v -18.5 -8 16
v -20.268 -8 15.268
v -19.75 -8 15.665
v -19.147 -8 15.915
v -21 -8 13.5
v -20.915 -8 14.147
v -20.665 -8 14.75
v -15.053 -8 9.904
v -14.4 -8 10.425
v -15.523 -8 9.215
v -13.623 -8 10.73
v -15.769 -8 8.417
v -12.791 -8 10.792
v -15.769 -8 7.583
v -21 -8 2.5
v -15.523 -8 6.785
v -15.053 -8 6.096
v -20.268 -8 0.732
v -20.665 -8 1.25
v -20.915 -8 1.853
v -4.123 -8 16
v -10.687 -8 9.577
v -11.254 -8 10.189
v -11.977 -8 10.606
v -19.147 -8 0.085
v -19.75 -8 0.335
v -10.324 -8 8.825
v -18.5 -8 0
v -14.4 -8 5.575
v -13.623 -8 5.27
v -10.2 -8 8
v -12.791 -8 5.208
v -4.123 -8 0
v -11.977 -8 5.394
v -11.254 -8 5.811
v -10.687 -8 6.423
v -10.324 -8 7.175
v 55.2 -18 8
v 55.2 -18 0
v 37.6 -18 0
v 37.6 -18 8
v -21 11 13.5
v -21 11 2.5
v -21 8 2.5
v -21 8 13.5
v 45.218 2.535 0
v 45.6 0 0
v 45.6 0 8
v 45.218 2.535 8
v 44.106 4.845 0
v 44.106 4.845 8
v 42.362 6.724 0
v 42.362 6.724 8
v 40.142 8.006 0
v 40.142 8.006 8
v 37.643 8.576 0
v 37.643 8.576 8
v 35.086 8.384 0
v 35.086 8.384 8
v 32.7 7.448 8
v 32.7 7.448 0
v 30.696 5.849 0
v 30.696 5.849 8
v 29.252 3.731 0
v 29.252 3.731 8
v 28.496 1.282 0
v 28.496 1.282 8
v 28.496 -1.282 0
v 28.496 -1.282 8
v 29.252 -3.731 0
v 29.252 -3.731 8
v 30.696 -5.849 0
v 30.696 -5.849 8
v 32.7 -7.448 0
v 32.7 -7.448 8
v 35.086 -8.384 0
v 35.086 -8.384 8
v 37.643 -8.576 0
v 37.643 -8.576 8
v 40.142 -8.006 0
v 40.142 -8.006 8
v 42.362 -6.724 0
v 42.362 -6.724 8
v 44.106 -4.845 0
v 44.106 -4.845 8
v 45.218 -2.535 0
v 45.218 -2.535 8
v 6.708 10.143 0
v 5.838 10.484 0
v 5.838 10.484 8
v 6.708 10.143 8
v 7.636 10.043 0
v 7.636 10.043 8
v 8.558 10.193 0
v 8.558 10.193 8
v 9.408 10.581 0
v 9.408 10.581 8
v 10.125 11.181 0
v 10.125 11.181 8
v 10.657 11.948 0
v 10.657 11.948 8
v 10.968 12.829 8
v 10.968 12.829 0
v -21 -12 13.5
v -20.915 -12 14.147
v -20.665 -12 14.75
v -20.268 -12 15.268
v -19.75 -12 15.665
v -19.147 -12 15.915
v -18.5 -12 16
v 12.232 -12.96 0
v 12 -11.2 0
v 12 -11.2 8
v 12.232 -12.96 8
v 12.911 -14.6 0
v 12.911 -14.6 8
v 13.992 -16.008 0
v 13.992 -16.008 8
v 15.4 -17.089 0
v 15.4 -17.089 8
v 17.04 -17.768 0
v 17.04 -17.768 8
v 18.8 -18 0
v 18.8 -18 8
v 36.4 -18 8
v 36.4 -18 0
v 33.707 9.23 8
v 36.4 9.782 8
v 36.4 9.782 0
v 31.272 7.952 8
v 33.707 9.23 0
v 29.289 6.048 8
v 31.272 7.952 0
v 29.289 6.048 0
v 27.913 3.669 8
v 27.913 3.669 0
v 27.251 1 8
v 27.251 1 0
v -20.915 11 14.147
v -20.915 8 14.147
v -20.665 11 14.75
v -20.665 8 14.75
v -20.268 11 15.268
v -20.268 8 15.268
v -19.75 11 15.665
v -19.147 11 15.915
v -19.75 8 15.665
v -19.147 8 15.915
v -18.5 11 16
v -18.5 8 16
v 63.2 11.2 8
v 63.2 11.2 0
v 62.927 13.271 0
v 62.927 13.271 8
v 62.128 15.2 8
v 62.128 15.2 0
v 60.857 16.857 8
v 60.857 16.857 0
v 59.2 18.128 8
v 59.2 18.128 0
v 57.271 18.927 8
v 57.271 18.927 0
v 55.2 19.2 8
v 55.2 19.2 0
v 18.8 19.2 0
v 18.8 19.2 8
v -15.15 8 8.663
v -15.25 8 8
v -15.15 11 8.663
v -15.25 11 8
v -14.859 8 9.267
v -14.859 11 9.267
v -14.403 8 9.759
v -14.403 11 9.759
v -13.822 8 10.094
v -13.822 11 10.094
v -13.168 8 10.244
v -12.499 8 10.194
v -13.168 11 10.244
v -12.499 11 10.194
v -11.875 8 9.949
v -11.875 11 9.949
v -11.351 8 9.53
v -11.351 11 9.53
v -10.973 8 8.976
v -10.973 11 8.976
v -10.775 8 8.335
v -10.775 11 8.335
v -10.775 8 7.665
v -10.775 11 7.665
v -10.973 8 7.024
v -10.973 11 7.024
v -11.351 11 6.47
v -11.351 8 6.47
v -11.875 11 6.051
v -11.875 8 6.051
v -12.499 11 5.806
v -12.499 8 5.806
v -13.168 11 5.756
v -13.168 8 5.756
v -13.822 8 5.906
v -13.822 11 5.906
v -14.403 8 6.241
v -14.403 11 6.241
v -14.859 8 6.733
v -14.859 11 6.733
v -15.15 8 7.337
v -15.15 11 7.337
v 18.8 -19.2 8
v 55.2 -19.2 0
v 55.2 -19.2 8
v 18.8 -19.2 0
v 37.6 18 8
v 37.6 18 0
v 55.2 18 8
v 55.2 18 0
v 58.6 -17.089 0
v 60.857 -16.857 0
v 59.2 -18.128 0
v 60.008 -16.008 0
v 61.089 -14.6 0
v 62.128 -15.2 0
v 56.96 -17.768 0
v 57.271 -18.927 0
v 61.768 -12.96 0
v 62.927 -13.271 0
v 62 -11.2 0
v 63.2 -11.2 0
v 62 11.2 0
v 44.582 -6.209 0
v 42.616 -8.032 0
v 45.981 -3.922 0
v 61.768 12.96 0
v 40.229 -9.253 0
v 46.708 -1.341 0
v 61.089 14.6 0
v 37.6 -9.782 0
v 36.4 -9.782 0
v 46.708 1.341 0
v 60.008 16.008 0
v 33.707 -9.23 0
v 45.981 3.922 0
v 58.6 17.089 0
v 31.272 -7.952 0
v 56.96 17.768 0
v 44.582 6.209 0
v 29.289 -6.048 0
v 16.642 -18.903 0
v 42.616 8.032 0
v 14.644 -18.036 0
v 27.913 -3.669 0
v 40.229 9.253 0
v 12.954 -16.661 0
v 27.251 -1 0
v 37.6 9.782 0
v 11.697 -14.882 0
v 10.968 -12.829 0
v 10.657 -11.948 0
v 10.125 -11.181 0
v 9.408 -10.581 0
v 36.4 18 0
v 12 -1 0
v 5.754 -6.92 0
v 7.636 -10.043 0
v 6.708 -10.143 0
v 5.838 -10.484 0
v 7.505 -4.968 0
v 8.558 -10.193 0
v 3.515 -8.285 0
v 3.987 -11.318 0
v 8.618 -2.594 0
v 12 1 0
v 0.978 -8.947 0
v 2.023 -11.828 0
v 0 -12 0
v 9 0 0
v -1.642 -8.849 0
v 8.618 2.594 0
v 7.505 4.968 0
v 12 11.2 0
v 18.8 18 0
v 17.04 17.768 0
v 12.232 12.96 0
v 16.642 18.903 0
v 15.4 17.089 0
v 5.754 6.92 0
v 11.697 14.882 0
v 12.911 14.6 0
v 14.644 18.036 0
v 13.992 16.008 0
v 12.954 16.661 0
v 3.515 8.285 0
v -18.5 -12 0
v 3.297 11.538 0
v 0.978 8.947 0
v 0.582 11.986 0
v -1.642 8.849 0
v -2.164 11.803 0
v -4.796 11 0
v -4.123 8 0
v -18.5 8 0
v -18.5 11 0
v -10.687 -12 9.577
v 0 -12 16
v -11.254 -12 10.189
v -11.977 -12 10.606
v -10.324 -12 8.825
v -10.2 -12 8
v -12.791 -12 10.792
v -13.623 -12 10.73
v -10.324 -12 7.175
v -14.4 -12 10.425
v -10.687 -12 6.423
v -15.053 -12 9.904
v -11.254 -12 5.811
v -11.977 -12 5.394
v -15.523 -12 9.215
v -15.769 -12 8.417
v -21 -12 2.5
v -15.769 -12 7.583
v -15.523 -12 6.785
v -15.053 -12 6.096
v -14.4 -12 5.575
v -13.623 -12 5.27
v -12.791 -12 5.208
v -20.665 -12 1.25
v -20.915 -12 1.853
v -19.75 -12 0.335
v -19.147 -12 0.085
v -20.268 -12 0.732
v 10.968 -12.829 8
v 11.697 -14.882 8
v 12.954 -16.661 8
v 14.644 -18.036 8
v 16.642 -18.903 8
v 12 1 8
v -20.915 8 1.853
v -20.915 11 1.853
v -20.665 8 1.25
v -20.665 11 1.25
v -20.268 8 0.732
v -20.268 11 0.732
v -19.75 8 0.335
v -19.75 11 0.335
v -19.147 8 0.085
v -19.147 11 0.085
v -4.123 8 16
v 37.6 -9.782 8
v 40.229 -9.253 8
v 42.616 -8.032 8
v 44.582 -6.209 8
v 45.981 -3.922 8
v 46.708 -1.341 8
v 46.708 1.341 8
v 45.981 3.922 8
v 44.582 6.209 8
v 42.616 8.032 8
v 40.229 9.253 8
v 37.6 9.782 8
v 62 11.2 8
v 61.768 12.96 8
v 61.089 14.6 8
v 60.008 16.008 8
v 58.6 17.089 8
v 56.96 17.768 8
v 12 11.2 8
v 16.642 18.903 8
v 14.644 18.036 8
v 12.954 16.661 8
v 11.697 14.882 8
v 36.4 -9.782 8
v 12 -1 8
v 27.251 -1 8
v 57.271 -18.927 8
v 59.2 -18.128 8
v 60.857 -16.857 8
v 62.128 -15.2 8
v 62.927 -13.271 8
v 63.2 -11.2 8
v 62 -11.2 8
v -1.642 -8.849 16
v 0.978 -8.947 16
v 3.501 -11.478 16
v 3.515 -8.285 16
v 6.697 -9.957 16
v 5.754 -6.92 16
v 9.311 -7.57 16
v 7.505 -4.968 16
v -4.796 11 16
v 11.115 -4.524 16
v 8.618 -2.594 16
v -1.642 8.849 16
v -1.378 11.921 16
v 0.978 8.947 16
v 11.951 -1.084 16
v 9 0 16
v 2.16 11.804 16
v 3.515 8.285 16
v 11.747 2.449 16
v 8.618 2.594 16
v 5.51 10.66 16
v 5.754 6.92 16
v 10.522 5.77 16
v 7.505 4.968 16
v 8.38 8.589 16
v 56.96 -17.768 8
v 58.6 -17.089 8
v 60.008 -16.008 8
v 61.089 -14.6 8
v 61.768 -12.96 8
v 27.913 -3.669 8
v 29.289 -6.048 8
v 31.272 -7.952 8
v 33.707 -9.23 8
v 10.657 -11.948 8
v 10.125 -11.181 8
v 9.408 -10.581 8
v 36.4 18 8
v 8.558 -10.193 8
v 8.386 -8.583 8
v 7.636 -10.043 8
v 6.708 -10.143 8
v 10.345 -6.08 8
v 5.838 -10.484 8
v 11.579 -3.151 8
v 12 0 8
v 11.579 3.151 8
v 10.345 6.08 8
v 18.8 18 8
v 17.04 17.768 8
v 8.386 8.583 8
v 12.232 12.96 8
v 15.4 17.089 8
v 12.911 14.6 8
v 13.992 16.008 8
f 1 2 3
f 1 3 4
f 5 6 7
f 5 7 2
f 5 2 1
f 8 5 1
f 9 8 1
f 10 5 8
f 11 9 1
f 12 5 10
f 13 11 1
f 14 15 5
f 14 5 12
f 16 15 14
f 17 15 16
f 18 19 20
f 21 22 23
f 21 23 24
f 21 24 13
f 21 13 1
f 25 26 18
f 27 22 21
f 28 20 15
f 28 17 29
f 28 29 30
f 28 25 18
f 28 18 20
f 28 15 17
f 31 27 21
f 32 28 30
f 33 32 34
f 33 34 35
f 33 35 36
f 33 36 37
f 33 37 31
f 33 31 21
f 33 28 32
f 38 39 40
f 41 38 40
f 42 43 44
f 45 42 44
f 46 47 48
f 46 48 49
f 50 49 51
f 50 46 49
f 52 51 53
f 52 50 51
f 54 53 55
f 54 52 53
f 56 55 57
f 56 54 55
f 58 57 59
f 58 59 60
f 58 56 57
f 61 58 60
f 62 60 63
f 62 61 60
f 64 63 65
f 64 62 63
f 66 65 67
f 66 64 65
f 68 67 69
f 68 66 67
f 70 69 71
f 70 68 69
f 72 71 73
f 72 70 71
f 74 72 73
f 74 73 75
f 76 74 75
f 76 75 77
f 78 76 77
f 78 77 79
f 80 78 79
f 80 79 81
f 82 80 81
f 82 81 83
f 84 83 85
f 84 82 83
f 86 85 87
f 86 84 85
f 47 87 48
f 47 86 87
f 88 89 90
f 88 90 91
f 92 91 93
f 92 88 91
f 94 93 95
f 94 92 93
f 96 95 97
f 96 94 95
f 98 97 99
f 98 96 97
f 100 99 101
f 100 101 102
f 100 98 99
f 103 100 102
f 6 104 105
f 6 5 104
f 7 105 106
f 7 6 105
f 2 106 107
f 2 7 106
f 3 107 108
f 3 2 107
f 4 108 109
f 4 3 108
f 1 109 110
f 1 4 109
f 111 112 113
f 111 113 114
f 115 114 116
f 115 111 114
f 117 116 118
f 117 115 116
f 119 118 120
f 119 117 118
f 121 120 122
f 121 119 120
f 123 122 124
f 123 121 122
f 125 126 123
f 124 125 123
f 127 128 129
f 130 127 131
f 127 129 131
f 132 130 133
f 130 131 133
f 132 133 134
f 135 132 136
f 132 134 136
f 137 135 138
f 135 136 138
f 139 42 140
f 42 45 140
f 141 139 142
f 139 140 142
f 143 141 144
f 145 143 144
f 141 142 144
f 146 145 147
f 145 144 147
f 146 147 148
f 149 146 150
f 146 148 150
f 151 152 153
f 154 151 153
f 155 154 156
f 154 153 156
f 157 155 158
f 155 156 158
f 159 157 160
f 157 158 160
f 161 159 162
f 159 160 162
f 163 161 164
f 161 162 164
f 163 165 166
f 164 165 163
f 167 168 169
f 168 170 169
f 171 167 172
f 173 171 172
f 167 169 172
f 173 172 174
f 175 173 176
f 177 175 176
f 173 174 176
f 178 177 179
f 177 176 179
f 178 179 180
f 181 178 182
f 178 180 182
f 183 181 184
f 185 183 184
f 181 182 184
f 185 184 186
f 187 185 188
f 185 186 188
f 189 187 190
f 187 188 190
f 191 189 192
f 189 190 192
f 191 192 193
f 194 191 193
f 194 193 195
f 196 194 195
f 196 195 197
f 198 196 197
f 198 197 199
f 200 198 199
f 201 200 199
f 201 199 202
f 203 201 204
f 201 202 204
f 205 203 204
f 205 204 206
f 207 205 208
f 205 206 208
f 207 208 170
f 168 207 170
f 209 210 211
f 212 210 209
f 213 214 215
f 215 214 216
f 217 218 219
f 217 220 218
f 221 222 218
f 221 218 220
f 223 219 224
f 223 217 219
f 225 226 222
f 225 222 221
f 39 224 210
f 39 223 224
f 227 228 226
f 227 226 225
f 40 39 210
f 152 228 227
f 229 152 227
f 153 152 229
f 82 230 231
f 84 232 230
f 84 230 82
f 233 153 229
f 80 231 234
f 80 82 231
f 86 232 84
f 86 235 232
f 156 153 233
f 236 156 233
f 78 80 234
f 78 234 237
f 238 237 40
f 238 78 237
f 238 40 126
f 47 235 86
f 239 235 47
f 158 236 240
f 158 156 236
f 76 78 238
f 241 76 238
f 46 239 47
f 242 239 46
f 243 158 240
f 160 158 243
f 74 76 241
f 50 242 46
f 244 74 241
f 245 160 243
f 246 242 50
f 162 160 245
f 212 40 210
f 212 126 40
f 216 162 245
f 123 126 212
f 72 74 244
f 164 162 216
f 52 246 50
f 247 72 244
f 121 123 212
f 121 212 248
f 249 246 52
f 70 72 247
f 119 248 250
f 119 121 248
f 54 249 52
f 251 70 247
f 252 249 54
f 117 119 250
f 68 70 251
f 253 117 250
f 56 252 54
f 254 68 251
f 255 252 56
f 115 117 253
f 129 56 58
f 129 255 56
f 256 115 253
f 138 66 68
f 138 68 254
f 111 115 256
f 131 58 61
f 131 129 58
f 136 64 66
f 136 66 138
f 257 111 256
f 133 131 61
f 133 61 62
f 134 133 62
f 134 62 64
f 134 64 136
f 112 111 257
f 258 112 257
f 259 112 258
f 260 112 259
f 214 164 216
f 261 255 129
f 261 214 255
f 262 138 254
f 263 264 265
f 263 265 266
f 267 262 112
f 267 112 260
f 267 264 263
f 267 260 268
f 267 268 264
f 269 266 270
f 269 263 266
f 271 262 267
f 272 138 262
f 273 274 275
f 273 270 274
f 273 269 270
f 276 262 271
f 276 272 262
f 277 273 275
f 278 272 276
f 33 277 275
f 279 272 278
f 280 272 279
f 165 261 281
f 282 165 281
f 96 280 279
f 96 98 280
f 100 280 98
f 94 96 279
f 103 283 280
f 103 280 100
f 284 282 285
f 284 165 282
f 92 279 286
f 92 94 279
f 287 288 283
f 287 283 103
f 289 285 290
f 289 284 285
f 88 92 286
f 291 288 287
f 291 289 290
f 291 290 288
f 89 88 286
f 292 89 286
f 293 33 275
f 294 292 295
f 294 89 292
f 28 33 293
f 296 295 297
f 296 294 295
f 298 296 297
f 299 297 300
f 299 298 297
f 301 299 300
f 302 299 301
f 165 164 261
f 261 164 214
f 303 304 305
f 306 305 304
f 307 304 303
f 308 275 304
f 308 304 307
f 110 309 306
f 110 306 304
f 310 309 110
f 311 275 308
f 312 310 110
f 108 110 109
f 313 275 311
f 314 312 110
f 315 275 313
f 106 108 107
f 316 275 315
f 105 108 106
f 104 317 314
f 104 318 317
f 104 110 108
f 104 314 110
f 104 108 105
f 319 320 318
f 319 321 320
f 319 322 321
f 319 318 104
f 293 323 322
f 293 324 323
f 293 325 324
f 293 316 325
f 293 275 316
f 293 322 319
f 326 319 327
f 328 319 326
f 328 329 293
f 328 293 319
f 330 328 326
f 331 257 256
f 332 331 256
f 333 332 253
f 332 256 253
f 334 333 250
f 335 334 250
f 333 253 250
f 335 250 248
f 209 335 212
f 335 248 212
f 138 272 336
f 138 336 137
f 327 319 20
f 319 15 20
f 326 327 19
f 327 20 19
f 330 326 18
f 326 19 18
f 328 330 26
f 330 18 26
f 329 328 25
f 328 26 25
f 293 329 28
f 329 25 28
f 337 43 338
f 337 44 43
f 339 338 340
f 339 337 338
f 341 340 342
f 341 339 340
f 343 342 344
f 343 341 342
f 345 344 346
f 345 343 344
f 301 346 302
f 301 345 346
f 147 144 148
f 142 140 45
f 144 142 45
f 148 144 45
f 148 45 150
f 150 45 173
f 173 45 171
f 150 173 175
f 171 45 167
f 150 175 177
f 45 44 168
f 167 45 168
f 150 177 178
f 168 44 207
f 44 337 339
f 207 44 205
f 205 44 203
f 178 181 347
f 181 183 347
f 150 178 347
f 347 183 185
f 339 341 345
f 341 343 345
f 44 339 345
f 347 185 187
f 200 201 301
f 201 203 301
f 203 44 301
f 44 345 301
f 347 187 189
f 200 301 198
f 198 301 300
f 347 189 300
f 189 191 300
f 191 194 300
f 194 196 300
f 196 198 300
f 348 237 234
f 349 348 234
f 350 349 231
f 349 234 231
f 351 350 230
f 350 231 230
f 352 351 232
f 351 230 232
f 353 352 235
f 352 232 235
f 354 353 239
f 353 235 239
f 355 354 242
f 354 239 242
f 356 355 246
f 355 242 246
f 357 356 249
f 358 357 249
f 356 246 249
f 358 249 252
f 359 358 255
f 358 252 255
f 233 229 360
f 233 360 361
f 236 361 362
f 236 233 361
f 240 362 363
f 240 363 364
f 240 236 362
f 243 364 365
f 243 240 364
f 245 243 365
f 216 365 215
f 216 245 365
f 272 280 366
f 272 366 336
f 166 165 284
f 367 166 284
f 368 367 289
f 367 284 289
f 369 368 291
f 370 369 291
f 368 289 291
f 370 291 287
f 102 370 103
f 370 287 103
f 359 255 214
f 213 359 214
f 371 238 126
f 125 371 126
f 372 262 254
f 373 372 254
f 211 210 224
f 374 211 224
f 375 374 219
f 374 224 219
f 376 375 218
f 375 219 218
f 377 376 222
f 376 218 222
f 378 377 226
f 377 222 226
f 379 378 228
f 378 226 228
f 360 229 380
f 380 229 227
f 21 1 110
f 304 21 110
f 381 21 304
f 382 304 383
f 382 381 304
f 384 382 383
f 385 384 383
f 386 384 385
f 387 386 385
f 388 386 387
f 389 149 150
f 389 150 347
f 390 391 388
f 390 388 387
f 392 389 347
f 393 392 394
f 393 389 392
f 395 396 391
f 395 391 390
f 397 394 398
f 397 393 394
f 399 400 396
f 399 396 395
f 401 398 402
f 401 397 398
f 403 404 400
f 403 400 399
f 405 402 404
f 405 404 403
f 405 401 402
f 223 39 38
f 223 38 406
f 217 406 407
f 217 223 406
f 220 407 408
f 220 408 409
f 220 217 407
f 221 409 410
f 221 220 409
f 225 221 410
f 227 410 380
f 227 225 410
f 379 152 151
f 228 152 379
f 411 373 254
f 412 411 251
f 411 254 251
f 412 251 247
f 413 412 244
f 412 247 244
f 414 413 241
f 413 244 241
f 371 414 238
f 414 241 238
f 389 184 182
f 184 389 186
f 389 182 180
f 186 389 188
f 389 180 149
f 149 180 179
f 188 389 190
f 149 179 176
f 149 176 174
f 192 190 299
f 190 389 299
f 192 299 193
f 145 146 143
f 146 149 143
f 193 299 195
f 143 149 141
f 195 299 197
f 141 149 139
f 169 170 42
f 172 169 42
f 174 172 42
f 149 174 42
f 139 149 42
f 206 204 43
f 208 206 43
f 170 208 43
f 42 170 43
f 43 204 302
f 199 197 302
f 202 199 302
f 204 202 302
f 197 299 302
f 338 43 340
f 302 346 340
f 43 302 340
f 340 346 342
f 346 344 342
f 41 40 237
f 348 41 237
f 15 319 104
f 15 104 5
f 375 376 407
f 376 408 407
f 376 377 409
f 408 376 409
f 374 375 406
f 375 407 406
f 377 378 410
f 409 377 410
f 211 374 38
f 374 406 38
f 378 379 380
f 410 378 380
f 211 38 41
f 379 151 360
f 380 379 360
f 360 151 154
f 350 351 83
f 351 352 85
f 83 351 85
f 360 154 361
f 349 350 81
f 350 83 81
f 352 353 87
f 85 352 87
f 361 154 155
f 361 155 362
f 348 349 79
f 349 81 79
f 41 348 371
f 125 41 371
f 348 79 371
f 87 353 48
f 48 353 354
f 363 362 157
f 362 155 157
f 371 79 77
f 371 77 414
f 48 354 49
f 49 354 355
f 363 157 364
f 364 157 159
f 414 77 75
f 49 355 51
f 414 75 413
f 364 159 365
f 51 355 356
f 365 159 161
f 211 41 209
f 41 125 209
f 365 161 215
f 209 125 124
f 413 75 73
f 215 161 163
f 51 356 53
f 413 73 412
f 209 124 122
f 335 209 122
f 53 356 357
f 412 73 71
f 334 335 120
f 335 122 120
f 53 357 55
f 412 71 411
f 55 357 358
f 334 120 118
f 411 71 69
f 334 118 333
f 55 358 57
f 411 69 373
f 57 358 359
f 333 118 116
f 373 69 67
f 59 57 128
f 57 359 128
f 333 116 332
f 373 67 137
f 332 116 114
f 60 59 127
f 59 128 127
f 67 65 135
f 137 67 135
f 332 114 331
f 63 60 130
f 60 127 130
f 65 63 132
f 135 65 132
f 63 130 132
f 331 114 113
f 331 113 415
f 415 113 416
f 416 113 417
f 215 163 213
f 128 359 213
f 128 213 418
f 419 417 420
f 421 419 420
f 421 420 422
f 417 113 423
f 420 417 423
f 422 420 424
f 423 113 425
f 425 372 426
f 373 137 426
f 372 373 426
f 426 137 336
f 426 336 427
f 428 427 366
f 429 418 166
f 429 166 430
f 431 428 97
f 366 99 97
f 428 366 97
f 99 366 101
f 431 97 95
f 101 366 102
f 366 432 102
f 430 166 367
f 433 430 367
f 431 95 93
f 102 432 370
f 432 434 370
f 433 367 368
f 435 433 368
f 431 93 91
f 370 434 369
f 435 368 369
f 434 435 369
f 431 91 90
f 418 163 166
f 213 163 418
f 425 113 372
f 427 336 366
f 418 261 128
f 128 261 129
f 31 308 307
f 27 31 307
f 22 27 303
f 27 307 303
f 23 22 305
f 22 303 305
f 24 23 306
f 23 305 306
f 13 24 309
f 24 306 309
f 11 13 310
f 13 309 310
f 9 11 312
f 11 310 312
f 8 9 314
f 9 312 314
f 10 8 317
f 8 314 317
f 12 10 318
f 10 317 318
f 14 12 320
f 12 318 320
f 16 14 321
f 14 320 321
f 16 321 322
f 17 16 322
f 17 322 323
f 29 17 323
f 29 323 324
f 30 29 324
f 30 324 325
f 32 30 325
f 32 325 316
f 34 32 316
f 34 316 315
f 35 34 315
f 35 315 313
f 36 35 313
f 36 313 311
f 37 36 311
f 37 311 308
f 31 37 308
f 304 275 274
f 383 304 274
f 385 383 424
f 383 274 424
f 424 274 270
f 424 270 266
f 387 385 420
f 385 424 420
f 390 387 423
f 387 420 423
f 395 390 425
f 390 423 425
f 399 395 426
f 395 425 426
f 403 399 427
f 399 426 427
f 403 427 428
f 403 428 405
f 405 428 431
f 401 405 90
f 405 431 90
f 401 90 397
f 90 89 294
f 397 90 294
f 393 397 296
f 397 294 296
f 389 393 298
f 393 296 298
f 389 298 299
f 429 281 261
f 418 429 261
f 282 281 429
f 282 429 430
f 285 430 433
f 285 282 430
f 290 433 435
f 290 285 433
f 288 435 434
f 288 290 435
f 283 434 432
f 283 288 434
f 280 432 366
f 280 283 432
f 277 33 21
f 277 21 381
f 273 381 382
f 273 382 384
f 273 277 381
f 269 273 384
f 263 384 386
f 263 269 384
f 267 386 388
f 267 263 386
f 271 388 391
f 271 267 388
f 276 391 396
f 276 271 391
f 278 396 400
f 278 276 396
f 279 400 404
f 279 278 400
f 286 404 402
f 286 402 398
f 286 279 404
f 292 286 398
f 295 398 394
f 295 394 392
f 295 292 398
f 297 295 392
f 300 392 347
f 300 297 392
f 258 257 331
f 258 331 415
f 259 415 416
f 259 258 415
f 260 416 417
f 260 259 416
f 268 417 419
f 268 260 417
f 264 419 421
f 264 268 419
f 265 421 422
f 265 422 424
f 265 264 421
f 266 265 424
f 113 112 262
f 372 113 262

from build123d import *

# Parameters (mm, degrees)
PAD005_DEPTH        = 16
FILLET004_R         = 2.5
HOLE005_D           = 4.5
HOLE005_CBORE_D     = 5.6
HOLE005_CBORE_DEPTH = 4.4
SKETCH025_R         = 8.6
PAD007_DEPTH        = 8
PAD008_DEPTH        = 8


with BuildPart() as part:
    # Sketch021 → Pad005 (new body)
    with BuildSketch(Plane.XY):
        with BuildLine():
            Line((-4.795832, 11), (-21, 11))
            Line((-21, 11), (-21, 8))
            Line((-21, 8), (-4.123106, 8))
            ThreePointArc((-4.123106, -8), (9, 0), (-4.123106, 8))
            Line((-21, -8), (-4.123106, -8))
            Line((-21, -12), (-21, -8))
            Line((0, -12), (-21, -12))
            ThreePointArc((0, -12), (11.74734, 2.44949), (-4.795832, 11))
        make_face()
    extrude(amount=PAD005_DEPTH)

    # Fillet004
    fillet004_edges = [part.edges().sort_by_distance(p)[0] for p in [
        (-21, 9.5, 0),
        (-21, 9.5, 16),
        (-21, -10, 16),
        (-21, -10, 0),
    ]]
    fillet(fillet004_edges, radius=FILLET004_R)

    # Hole005 (through all)
    with Locations(Plane.XZ.offset(12)):
        with Locations((-13, 8)):
            CounterBoreHole(HOLE005_D / 2, HOLE005_CBORE_D / 2, HOLE005_CBORE_DEPTH)

    # Sketch025 → Pad007 (join)
    with BuildSketch(Plane.XY):
        with BuildLine():
            ThreePointArc((18.8, 19.2), (13.143146, 16.856854), (10.8, 11.2))
            Line((10.8, -11.2), (10.8, 11.2))
            ThreePointArc((10.8, -11.2), (13.143146, -16.856854), (18.8, -19.2))
            Line((55.2, -19.2), (18.8, -19.2))
            ThreePointArc((55.2, -19.2), (60.856854, -16.856854), (63.2, -11.2))
            Line((63.2, 11.2), (63.2, -11.2))
            ThreePointArc((63.2, 11.2), (60.856854, 16.856854), (55.2, 19.2))
            Line((18.8, 19.2), (55.2, 19.2))
        make_face()
        with Locations((37, 0)):
            Circle(SKETCH025_R, mode=Mode.SUBTRACT)
        with BuildLine():
            ThreePointArc((18.8, 18), (13.991674, 16.008326), (12, 11.2))
            Line((12, 11.2), (12, 1))
            Line((12, 1), (27.251154, 1))
            ThreePointArc((36.4, 9.781615), (30.213702, 7.070089), (27.251154, 1))
            Line((36.4, 18), (36.4, 9.781615))
            Line((18.8, 18), (36.4, 18))
        make_face(mode=Mode.SUBTRACT)
        with BuildLine():
            ThreePointArc((62, 11.2), (60.008326, 16.008326), (55.2, 18))
            Line((37.6, 18), (55.2, 18))
            Line((37.6, 9.781615), (37.6, 18))
            ThreePointArc((37.6, -9.781615), (46.8, 0), (37.6, 9.781615))
            Line((37.6, -18), (37.6, -9.781615))
            Line((55.2, -18), (37.6, -18))
            ThreePointArc((55.2, -18), (60.008326, -16.008326), (62, -11.2))
            Line((62, 11.2), (62, -11.2))
        make_face(mode=Mode.SUBTRACT)
        with BuildLine():
            ThreePointArc((12, -11.2), (13.991674, -16.008326), (18.8, -18))
            Line((36.4, -18), (18.8, -18))
            Line((36.4, -9.781615), (36.4, -18))
            ThreePointArc((27.251154, -1), (30.213702, -7.070089), (36.4, -9.781615))
            Line((12, -1), (27.251154, -1))
            Line((12, -11.2), (12, -1))
        make_face(mode=Mode.SUBTRACT)
    extrude(amount=PAD007_DEPTH)

    # Sketch026 → Pad008 (join)
    with BuildSketch(Plane.XY):
        with BuildLine():
            ThreePointArc((5.838182, 10.484066), (8.996246, 10.358804), (10.967642, 12.82916))
            Line((10.967642, 12.82916), (10.967642, -12.82916))
            ThreePointArc((10.967642, -12.82916), (8.996246, -10.358804), (5.838182, -10.484066))
            Line((5.838182, -10.484066), (4.427288, -7.950416))
            ThreePointArc((4.427288, -7.950416), (9.1, 0), (4.427288, 7.950416))
            Line((5.838182, 10.484066), (4.427288, 7.950416))
        make_face()
    extrude(amount=PAD008_DEPTH)


solid = part.part
